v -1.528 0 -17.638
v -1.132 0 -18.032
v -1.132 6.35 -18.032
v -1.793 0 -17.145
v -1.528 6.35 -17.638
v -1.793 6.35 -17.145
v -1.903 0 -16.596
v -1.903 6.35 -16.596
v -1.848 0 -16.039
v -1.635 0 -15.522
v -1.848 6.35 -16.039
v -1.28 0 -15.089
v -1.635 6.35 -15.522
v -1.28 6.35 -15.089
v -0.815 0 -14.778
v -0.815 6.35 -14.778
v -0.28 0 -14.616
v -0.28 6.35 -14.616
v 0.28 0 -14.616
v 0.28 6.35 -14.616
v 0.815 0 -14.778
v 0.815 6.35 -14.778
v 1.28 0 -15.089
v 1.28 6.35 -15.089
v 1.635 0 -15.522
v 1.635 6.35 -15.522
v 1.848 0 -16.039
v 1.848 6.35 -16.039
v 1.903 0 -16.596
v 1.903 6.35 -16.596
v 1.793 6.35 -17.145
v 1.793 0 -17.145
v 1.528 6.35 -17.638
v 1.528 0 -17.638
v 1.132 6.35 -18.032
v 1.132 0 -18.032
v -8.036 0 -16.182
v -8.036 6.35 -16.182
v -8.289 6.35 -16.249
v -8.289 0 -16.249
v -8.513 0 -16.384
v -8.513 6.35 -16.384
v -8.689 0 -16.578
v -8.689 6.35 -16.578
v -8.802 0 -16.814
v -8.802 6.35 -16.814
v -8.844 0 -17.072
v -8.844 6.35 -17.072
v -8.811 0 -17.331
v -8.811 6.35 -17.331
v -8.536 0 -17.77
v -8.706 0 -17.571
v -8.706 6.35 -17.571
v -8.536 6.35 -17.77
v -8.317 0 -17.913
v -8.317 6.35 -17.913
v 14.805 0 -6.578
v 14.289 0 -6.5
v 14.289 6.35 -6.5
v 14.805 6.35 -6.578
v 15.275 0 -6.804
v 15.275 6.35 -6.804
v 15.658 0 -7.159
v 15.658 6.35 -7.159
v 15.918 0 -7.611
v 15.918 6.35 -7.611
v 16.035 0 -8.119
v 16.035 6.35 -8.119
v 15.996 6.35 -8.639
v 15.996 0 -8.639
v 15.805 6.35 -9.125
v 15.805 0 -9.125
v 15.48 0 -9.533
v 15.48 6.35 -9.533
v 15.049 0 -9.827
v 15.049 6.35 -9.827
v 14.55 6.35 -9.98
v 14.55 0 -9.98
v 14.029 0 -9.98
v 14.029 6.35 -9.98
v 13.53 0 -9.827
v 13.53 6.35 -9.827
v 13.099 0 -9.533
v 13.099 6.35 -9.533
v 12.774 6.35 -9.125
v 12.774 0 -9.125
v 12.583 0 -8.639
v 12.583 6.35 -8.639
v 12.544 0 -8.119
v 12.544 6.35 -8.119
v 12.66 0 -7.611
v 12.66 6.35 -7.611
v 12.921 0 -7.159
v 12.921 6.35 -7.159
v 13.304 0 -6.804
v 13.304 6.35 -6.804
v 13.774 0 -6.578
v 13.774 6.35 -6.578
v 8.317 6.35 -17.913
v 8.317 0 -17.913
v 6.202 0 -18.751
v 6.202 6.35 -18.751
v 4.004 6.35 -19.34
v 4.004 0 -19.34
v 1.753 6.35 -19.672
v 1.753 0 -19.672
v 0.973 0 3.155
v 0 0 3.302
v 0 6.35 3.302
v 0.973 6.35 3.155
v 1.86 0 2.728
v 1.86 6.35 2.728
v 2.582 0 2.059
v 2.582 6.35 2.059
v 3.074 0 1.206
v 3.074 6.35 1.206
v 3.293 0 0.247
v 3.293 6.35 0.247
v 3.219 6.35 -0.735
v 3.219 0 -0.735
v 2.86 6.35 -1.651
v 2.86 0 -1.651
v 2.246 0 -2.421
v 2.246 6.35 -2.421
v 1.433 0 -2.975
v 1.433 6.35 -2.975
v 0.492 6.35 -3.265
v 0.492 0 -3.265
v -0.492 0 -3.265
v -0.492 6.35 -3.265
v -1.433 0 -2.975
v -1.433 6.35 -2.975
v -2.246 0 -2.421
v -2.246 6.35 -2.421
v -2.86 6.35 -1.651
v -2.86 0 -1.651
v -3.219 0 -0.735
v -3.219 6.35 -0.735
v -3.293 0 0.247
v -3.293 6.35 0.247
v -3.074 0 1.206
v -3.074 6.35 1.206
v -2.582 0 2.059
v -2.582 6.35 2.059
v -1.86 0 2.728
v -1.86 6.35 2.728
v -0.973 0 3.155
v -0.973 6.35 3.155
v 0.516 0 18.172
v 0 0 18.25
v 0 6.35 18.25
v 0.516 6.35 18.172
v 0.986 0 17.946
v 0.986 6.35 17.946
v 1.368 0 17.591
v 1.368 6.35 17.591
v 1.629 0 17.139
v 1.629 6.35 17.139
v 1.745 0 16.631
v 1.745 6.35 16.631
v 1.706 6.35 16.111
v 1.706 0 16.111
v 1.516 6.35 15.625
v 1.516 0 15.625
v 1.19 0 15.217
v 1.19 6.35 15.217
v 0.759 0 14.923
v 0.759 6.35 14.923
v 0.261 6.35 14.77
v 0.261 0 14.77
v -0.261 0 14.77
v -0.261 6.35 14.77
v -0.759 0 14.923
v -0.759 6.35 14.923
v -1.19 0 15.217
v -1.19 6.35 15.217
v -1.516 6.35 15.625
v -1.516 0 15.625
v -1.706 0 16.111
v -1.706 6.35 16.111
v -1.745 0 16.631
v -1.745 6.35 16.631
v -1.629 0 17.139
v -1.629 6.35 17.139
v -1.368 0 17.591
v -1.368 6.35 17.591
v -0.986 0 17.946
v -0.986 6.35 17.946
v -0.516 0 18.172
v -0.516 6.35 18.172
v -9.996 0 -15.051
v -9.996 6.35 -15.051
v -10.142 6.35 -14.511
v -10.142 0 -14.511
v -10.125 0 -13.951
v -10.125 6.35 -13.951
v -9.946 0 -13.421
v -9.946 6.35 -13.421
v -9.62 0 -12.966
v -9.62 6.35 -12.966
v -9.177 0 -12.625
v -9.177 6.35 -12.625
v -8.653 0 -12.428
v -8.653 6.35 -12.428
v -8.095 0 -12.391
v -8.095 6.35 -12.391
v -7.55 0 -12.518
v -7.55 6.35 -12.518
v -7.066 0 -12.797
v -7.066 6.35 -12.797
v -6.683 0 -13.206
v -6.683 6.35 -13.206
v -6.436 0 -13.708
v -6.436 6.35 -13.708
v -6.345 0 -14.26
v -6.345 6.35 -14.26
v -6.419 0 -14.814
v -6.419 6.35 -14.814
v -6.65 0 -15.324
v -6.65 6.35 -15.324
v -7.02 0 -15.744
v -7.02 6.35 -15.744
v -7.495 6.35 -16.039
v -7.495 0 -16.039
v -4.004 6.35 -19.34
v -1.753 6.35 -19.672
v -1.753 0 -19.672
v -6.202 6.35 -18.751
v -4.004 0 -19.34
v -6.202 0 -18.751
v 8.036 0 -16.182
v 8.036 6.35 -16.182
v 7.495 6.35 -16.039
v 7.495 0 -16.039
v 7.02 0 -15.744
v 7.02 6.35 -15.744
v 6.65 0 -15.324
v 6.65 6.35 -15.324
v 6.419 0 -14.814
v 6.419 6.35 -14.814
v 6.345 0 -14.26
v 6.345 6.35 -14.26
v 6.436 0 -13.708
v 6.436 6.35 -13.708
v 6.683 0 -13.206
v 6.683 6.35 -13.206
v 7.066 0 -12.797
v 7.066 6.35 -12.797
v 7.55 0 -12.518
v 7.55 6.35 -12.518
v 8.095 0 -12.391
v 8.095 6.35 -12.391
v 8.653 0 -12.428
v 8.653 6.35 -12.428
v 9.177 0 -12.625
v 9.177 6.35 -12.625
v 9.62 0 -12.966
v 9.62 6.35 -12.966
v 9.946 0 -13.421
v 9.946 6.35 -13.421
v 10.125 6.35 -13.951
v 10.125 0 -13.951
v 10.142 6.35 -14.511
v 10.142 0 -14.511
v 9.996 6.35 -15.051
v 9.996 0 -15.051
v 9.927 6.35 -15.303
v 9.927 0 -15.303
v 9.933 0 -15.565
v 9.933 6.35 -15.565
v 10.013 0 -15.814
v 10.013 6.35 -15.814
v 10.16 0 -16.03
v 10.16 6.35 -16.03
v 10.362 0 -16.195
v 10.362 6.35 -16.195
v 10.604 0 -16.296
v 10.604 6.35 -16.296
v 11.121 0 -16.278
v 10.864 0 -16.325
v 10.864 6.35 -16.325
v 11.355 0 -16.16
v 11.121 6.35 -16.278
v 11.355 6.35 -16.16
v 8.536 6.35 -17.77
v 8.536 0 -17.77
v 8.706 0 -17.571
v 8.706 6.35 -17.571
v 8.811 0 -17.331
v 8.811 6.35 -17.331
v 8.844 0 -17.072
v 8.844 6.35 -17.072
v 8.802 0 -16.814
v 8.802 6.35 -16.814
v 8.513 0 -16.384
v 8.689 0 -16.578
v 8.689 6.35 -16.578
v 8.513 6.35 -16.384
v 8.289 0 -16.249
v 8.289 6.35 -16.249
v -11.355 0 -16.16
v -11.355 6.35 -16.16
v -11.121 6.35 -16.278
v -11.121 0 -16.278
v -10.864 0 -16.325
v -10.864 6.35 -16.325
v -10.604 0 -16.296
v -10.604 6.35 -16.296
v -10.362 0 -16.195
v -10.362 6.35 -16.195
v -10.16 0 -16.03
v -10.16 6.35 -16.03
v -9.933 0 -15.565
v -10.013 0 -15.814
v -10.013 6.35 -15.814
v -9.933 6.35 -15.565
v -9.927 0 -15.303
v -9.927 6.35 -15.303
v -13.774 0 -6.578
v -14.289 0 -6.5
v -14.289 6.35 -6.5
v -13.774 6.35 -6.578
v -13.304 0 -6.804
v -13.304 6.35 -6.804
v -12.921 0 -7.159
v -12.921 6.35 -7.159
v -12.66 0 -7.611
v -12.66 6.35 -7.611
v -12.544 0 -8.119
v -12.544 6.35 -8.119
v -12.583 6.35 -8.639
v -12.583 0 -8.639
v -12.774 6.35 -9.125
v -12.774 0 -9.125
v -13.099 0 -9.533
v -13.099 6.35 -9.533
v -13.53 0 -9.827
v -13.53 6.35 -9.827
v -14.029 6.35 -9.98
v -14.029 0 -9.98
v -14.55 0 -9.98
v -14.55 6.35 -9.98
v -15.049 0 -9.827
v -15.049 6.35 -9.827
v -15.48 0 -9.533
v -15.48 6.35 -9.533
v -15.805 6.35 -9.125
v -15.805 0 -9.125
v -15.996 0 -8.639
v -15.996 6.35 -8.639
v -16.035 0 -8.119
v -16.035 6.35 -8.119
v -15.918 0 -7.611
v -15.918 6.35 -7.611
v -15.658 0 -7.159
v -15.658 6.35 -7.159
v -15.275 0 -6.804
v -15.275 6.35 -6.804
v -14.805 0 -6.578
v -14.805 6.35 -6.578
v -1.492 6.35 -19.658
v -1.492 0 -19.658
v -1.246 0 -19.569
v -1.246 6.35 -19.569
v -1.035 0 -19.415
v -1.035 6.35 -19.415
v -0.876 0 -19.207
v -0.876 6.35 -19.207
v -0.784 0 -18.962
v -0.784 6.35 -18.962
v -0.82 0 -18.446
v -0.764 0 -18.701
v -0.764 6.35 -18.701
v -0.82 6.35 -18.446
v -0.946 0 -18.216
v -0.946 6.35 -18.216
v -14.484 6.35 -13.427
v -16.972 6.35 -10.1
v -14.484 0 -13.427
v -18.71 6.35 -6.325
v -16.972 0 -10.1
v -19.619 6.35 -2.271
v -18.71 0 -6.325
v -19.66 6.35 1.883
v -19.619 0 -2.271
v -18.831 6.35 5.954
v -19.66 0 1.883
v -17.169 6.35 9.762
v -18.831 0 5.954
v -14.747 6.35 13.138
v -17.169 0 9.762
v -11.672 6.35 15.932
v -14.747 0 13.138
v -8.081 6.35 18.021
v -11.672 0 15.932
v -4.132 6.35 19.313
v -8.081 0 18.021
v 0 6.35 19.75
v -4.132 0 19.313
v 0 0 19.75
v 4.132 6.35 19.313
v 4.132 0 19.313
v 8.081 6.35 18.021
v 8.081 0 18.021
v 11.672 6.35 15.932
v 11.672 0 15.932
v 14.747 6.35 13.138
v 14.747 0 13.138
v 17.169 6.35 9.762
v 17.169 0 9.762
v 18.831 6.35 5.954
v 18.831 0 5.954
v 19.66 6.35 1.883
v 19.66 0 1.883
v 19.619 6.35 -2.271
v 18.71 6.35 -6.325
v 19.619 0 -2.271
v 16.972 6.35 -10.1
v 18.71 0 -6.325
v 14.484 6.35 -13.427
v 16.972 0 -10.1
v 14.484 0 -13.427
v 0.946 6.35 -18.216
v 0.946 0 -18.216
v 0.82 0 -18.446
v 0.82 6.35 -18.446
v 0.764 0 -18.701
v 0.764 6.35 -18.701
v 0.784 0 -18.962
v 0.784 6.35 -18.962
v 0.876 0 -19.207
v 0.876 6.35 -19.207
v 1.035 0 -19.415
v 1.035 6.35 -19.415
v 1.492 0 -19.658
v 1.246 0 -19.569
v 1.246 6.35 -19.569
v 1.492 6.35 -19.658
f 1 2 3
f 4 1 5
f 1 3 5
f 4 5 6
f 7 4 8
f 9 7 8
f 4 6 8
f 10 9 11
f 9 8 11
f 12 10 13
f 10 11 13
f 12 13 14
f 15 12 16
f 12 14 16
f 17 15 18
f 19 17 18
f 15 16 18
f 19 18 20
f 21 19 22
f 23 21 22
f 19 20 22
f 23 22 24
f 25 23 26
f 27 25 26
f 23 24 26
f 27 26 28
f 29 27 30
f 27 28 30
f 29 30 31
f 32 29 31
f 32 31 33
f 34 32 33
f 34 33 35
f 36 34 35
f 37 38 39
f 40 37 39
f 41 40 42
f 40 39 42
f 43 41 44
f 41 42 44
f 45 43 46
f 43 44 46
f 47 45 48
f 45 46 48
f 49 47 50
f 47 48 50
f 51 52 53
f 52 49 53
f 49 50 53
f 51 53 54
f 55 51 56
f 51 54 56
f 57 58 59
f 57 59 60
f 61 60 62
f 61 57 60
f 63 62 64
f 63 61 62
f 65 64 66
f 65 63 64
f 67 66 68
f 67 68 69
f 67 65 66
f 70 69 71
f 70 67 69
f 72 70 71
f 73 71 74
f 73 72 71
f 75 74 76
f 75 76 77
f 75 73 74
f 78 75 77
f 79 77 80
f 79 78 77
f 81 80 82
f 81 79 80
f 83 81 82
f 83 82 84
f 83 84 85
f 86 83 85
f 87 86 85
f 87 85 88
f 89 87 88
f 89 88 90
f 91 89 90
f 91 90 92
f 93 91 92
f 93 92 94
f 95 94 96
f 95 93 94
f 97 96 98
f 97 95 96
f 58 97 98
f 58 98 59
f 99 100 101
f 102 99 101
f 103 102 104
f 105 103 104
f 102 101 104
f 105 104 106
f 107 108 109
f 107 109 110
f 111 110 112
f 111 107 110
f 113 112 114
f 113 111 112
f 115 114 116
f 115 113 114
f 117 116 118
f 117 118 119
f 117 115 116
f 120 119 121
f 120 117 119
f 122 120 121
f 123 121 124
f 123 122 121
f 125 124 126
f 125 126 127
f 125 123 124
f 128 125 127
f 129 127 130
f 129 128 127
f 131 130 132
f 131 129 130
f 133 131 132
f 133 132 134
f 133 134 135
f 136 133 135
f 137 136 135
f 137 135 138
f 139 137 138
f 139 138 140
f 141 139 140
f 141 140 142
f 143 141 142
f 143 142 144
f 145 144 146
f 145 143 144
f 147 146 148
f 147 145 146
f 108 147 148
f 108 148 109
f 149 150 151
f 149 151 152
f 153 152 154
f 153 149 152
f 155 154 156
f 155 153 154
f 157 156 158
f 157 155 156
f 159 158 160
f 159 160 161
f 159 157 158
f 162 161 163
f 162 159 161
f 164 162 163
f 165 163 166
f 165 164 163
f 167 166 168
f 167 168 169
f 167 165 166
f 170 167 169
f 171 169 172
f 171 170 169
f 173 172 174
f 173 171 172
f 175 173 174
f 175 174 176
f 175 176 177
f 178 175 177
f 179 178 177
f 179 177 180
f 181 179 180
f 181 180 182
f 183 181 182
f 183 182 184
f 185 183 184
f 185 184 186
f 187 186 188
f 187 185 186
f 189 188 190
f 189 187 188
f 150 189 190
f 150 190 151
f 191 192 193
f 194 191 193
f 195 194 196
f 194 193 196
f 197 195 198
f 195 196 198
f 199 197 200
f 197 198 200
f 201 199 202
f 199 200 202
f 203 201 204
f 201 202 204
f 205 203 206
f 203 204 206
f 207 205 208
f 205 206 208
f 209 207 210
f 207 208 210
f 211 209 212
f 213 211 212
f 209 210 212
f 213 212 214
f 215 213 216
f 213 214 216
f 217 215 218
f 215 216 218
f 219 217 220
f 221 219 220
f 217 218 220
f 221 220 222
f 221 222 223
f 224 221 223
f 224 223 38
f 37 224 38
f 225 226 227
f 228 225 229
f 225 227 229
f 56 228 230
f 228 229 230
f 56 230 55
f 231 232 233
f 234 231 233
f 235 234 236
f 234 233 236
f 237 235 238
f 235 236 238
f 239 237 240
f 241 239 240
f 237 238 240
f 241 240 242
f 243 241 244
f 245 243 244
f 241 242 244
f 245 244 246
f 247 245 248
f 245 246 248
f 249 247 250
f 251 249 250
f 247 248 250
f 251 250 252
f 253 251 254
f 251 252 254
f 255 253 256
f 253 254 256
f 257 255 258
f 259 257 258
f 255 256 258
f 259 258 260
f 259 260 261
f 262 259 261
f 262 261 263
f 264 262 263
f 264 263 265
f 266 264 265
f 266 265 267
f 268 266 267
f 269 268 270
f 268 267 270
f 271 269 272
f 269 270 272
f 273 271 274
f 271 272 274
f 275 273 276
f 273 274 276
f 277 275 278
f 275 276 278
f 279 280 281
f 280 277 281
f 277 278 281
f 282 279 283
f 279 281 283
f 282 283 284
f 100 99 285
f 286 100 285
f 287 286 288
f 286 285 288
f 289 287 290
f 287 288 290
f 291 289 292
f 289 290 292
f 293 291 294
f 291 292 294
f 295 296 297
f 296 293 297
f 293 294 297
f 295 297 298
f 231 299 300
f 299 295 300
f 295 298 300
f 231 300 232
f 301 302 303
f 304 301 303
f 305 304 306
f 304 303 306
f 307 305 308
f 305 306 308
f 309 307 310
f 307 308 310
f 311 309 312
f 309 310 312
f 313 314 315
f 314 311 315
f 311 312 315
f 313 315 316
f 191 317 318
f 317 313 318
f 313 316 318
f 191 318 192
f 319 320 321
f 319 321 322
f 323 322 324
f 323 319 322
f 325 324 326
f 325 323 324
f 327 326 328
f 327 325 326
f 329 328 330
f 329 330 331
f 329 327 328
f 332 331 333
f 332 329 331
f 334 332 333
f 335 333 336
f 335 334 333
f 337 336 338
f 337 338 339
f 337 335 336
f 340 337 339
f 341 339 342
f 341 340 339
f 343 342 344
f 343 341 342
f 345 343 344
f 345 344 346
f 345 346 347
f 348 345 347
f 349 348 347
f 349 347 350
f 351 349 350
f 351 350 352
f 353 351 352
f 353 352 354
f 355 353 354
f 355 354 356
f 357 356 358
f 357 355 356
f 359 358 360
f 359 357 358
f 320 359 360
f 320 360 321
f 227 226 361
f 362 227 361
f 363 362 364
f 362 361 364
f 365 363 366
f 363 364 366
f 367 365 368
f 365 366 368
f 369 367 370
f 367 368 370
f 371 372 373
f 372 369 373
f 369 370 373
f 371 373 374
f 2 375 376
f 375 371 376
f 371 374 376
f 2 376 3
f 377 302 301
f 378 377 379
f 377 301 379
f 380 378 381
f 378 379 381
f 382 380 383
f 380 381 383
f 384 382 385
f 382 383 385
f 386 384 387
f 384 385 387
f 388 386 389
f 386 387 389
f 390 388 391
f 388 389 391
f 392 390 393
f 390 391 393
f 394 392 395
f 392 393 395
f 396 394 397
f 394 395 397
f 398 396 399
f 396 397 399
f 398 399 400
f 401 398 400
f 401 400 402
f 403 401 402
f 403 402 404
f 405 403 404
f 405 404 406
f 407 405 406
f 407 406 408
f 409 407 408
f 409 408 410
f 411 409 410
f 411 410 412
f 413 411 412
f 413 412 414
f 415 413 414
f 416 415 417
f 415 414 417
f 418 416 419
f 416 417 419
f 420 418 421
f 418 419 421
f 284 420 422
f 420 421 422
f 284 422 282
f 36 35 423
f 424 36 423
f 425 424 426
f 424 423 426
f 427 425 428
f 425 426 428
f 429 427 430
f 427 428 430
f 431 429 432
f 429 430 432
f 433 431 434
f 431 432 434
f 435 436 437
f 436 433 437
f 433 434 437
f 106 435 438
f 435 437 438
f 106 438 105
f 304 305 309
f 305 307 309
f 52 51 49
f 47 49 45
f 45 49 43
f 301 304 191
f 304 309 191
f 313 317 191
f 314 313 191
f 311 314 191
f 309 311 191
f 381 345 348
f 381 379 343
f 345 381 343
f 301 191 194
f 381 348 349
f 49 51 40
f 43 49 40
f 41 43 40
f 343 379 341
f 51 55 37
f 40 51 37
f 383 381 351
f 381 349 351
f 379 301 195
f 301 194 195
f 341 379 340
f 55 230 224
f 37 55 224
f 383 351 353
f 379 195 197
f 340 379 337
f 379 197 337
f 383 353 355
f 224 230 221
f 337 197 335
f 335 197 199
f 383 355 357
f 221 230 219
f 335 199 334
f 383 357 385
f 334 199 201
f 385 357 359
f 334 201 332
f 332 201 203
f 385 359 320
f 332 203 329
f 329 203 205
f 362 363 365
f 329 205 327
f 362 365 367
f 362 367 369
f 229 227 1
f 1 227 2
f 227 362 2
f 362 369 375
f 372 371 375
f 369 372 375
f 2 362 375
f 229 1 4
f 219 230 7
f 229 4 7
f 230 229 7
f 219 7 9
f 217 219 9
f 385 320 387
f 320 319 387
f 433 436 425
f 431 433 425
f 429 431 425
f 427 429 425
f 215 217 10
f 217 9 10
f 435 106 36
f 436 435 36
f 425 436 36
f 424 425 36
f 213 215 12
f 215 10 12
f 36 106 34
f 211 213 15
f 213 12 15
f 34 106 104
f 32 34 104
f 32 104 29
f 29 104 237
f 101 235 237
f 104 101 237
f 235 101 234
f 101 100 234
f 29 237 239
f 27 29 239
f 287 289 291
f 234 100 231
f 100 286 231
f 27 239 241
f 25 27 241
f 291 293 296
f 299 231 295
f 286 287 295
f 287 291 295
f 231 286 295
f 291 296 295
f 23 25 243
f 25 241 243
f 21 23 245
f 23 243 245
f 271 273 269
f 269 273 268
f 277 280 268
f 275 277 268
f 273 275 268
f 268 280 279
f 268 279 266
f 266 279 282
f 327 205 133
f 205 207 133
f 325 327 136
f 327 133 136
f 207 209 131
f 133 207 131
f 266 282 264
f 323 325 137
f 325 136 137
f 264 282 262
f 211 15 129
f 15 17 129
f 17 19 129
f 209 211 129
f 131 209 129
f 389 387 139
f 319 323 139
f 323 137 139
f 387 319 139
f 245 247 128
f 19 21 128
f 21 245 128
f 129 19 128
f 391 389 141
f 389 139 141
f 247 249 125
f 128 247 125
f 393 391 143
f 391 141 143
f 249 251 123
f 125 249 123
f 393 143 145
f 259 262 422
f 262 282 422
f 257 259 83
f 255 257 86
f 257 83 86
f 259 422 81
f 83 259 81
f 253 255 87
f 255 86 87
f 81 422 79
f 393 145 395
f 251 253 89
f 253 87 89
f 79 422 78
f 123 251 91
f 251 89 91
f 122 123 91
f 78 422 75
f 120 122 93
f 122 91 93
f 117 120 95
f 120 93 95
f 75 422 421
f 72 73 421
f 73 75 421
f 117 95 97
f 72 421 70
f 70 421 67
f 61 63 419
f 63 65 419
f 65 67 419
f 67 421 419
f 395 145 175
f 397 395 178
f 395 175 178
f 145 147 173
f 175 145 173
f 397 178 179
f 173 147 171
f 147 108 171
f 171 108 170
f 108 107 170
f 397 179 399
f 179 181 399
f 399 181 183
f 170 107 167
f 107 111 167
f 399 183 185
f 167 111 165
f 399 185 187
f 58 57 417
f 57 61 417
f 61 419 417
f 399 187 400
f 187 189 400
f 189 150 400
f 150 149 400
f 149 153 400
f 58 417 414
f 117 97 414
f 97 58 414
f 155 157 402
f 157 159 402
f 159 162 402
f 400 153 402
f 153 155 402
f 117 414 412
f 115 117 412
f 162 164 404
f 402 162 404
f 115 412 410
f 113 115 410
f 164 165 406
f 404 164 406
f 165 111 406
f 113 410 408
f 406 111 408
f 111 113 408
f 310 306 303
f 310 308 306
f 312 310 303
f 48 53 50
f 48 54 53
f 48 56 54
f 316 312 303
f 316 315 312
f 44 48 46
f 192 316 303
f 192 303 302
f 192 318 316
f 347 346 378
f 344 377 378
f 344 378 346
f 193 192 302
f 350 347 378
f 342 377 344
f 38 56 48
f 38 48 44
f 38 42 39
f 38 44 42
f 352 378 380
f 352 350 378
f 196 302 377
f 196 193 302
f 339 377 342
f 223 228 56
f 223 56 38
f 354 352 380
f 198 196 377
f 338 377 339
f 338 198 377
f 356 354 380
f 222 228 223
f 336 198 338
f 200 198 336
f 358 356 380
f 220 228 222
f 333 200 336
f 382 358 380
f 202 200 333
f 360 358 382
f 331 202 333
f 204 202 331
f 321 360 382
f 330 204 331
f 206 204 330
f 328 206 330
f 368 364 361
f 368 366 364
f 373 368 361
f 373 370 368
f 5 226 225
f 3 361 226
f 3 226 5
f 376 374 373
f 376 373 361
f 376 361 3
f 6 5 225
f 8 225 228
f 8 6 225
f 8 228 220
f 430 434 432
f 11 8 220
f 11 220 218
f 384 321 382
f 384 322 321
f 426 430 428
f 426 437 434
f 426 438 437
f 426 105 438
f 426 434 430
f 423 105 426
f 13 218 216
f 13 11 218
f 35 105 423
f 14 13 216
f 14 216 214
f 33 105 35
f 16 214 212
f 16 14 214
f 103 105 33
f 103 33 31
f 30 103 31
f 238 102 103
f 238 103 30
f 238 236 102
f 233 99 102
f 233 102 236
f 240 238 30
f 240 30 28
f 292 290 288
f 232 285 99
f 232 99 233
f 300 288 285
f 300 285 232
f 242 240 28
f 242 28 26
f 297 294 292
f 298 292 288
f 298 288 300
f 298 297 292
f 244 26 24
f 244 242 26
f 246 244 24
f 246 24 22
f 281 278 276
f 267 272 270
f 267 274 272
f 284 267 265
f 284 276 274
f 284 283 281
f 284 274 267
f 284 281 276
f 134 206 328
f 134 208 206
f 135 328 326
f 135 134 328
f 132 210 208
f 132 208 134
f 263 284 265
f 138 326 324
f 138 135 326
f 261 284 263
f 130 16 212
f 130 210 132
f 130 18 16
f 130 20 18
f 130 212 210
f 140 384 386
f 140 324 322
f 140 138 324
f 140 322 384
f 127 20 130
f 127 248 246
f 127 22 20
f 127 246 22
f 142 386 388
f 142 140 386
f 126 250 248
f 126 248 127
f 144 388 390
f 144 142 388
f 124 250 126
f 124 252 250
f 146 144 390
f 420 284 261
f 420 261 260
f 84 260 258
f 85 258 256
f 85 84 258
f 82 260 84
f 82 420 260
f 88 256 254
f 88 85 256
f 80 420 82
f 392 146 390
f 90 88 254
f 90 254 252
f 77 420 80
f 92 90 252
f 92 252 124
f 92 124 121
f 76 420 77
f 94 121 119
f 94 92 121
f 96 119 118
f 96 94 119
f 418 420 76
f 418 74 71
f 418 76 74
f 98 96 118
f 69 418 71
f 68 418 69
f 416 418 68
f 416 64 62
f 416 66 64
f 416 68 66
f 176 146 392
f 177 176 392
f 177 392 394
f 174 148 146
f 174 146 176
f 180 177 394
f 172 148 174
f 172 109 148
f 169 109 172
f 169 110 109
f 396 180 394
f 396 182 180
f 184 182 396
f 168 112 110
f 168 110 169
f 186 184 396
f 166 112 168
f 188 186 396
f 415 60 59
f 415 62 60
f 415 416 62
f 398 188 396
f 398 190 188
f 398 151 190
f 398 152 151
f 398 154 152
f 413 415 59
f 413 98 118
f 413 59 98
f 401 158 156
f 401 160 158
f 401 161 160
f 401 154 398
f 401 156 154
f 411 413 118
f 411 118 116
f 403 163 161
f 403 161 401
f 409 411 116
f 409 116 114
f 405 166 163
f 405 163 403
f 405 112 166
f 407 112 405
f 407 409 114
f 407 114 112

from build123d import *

# Parameters (mm, degrees)
SKETCH1_R           = 19.75
SKETCH1_R_2         = 3.302
SKETCH1_R_3         = 1.75
BOSS_EXTRUDE1_DEPTH = 6.35
CUT_EXTRUDE1_DEPTH  = 7.35
CIRPATTERN1_COUNT   = 3
CIRPATTERN1_ANGLE   = 60


with BuildPart() as part:
    # Sketch1 → Boss-Extrude1 (new body)
    with BuildSketch(Plane(origin=(0, 0, 0), x_dir=(1, 0, 0), z_dir=(0, 1, 0))):
        with Locations(Location((0, 0, 0), (0, 0, 270))):  # turned: the seam where the file's is
            Circle(SKETCH1_R)
        with Locations(Location((0, 0, 0), (0, 0, 270))):  # turned: the seam where the file's is
            Circle(SKETCH1_R_2, mode=Mode.SUBTRACT)
        with Locations(Location((-14.289419162, 8.25, 0), (0, 0, 270))):  # turned: the seam where the file's is
            Circle(SKETCH1_R_3, mode=Mode.SUBTRACT)
        with Locations(Location((0, -16.5, 0), (0, 0, 270))):  # turned: the seam where the file's is
            Circle(SKETCH1_R_3, mode=Mode.SUBTRACT)
        with Locations(Location((14.289419162, 8.25, 0), (0, 0, 270))):  # turned: the seam where the file's is
            Circle(SKETCH1_R_3, mode=Mode.SUBTRACT)
    extrude(amount=BOSS_EXTRUDE1_DEPTH)

    # Sketch2 → Cut-Extrude1 (cut, through all)
    with BuildSketch(Plane(origin=(0, 6.35, 0), x_dir=(1, 0, 0), z_dir=(0, 1, 0))):
        with BuildLine():
            ThreePointArc((8.036161973, 16.182379357), (7.2975, 12.639640768), (9.99627063, 15.050710096))
            ThreePointArc((9.99627063, 15.050710096), (10.255103275, 16.120005739), (11.354562521, 16.159715652))
            ThreePointArc((11.354562521, 16.159715652), (9.875, 17.104001725), (8.317443012, 17.913197418))
            ThreePointArc((8.317443012, 17.913197418), (8.832782842, 16.941182824), (8.036161973, 16.182379357))
        make_face()
    cut_extrude1 = extrude(amount=-CUT_EXTRUDE1_DEPTH, mode=Mode.SUBTRACT)

    # CirPattern1: Cut-Extrude1 ×3 about axis
    cirpattern1_axis = Axis((0, 0, 0), (0, 1, 0))
    for i in range(1, CIRPATTERN1_COUNT):
        add(cut_extrude1.rotate(cirpattern1_axis, i * CIRPATTERN1_ANGLE / (CIRPATTERN1_COUNT - 1)), mode=Mode.SUBTRACT)


solid = part.part
